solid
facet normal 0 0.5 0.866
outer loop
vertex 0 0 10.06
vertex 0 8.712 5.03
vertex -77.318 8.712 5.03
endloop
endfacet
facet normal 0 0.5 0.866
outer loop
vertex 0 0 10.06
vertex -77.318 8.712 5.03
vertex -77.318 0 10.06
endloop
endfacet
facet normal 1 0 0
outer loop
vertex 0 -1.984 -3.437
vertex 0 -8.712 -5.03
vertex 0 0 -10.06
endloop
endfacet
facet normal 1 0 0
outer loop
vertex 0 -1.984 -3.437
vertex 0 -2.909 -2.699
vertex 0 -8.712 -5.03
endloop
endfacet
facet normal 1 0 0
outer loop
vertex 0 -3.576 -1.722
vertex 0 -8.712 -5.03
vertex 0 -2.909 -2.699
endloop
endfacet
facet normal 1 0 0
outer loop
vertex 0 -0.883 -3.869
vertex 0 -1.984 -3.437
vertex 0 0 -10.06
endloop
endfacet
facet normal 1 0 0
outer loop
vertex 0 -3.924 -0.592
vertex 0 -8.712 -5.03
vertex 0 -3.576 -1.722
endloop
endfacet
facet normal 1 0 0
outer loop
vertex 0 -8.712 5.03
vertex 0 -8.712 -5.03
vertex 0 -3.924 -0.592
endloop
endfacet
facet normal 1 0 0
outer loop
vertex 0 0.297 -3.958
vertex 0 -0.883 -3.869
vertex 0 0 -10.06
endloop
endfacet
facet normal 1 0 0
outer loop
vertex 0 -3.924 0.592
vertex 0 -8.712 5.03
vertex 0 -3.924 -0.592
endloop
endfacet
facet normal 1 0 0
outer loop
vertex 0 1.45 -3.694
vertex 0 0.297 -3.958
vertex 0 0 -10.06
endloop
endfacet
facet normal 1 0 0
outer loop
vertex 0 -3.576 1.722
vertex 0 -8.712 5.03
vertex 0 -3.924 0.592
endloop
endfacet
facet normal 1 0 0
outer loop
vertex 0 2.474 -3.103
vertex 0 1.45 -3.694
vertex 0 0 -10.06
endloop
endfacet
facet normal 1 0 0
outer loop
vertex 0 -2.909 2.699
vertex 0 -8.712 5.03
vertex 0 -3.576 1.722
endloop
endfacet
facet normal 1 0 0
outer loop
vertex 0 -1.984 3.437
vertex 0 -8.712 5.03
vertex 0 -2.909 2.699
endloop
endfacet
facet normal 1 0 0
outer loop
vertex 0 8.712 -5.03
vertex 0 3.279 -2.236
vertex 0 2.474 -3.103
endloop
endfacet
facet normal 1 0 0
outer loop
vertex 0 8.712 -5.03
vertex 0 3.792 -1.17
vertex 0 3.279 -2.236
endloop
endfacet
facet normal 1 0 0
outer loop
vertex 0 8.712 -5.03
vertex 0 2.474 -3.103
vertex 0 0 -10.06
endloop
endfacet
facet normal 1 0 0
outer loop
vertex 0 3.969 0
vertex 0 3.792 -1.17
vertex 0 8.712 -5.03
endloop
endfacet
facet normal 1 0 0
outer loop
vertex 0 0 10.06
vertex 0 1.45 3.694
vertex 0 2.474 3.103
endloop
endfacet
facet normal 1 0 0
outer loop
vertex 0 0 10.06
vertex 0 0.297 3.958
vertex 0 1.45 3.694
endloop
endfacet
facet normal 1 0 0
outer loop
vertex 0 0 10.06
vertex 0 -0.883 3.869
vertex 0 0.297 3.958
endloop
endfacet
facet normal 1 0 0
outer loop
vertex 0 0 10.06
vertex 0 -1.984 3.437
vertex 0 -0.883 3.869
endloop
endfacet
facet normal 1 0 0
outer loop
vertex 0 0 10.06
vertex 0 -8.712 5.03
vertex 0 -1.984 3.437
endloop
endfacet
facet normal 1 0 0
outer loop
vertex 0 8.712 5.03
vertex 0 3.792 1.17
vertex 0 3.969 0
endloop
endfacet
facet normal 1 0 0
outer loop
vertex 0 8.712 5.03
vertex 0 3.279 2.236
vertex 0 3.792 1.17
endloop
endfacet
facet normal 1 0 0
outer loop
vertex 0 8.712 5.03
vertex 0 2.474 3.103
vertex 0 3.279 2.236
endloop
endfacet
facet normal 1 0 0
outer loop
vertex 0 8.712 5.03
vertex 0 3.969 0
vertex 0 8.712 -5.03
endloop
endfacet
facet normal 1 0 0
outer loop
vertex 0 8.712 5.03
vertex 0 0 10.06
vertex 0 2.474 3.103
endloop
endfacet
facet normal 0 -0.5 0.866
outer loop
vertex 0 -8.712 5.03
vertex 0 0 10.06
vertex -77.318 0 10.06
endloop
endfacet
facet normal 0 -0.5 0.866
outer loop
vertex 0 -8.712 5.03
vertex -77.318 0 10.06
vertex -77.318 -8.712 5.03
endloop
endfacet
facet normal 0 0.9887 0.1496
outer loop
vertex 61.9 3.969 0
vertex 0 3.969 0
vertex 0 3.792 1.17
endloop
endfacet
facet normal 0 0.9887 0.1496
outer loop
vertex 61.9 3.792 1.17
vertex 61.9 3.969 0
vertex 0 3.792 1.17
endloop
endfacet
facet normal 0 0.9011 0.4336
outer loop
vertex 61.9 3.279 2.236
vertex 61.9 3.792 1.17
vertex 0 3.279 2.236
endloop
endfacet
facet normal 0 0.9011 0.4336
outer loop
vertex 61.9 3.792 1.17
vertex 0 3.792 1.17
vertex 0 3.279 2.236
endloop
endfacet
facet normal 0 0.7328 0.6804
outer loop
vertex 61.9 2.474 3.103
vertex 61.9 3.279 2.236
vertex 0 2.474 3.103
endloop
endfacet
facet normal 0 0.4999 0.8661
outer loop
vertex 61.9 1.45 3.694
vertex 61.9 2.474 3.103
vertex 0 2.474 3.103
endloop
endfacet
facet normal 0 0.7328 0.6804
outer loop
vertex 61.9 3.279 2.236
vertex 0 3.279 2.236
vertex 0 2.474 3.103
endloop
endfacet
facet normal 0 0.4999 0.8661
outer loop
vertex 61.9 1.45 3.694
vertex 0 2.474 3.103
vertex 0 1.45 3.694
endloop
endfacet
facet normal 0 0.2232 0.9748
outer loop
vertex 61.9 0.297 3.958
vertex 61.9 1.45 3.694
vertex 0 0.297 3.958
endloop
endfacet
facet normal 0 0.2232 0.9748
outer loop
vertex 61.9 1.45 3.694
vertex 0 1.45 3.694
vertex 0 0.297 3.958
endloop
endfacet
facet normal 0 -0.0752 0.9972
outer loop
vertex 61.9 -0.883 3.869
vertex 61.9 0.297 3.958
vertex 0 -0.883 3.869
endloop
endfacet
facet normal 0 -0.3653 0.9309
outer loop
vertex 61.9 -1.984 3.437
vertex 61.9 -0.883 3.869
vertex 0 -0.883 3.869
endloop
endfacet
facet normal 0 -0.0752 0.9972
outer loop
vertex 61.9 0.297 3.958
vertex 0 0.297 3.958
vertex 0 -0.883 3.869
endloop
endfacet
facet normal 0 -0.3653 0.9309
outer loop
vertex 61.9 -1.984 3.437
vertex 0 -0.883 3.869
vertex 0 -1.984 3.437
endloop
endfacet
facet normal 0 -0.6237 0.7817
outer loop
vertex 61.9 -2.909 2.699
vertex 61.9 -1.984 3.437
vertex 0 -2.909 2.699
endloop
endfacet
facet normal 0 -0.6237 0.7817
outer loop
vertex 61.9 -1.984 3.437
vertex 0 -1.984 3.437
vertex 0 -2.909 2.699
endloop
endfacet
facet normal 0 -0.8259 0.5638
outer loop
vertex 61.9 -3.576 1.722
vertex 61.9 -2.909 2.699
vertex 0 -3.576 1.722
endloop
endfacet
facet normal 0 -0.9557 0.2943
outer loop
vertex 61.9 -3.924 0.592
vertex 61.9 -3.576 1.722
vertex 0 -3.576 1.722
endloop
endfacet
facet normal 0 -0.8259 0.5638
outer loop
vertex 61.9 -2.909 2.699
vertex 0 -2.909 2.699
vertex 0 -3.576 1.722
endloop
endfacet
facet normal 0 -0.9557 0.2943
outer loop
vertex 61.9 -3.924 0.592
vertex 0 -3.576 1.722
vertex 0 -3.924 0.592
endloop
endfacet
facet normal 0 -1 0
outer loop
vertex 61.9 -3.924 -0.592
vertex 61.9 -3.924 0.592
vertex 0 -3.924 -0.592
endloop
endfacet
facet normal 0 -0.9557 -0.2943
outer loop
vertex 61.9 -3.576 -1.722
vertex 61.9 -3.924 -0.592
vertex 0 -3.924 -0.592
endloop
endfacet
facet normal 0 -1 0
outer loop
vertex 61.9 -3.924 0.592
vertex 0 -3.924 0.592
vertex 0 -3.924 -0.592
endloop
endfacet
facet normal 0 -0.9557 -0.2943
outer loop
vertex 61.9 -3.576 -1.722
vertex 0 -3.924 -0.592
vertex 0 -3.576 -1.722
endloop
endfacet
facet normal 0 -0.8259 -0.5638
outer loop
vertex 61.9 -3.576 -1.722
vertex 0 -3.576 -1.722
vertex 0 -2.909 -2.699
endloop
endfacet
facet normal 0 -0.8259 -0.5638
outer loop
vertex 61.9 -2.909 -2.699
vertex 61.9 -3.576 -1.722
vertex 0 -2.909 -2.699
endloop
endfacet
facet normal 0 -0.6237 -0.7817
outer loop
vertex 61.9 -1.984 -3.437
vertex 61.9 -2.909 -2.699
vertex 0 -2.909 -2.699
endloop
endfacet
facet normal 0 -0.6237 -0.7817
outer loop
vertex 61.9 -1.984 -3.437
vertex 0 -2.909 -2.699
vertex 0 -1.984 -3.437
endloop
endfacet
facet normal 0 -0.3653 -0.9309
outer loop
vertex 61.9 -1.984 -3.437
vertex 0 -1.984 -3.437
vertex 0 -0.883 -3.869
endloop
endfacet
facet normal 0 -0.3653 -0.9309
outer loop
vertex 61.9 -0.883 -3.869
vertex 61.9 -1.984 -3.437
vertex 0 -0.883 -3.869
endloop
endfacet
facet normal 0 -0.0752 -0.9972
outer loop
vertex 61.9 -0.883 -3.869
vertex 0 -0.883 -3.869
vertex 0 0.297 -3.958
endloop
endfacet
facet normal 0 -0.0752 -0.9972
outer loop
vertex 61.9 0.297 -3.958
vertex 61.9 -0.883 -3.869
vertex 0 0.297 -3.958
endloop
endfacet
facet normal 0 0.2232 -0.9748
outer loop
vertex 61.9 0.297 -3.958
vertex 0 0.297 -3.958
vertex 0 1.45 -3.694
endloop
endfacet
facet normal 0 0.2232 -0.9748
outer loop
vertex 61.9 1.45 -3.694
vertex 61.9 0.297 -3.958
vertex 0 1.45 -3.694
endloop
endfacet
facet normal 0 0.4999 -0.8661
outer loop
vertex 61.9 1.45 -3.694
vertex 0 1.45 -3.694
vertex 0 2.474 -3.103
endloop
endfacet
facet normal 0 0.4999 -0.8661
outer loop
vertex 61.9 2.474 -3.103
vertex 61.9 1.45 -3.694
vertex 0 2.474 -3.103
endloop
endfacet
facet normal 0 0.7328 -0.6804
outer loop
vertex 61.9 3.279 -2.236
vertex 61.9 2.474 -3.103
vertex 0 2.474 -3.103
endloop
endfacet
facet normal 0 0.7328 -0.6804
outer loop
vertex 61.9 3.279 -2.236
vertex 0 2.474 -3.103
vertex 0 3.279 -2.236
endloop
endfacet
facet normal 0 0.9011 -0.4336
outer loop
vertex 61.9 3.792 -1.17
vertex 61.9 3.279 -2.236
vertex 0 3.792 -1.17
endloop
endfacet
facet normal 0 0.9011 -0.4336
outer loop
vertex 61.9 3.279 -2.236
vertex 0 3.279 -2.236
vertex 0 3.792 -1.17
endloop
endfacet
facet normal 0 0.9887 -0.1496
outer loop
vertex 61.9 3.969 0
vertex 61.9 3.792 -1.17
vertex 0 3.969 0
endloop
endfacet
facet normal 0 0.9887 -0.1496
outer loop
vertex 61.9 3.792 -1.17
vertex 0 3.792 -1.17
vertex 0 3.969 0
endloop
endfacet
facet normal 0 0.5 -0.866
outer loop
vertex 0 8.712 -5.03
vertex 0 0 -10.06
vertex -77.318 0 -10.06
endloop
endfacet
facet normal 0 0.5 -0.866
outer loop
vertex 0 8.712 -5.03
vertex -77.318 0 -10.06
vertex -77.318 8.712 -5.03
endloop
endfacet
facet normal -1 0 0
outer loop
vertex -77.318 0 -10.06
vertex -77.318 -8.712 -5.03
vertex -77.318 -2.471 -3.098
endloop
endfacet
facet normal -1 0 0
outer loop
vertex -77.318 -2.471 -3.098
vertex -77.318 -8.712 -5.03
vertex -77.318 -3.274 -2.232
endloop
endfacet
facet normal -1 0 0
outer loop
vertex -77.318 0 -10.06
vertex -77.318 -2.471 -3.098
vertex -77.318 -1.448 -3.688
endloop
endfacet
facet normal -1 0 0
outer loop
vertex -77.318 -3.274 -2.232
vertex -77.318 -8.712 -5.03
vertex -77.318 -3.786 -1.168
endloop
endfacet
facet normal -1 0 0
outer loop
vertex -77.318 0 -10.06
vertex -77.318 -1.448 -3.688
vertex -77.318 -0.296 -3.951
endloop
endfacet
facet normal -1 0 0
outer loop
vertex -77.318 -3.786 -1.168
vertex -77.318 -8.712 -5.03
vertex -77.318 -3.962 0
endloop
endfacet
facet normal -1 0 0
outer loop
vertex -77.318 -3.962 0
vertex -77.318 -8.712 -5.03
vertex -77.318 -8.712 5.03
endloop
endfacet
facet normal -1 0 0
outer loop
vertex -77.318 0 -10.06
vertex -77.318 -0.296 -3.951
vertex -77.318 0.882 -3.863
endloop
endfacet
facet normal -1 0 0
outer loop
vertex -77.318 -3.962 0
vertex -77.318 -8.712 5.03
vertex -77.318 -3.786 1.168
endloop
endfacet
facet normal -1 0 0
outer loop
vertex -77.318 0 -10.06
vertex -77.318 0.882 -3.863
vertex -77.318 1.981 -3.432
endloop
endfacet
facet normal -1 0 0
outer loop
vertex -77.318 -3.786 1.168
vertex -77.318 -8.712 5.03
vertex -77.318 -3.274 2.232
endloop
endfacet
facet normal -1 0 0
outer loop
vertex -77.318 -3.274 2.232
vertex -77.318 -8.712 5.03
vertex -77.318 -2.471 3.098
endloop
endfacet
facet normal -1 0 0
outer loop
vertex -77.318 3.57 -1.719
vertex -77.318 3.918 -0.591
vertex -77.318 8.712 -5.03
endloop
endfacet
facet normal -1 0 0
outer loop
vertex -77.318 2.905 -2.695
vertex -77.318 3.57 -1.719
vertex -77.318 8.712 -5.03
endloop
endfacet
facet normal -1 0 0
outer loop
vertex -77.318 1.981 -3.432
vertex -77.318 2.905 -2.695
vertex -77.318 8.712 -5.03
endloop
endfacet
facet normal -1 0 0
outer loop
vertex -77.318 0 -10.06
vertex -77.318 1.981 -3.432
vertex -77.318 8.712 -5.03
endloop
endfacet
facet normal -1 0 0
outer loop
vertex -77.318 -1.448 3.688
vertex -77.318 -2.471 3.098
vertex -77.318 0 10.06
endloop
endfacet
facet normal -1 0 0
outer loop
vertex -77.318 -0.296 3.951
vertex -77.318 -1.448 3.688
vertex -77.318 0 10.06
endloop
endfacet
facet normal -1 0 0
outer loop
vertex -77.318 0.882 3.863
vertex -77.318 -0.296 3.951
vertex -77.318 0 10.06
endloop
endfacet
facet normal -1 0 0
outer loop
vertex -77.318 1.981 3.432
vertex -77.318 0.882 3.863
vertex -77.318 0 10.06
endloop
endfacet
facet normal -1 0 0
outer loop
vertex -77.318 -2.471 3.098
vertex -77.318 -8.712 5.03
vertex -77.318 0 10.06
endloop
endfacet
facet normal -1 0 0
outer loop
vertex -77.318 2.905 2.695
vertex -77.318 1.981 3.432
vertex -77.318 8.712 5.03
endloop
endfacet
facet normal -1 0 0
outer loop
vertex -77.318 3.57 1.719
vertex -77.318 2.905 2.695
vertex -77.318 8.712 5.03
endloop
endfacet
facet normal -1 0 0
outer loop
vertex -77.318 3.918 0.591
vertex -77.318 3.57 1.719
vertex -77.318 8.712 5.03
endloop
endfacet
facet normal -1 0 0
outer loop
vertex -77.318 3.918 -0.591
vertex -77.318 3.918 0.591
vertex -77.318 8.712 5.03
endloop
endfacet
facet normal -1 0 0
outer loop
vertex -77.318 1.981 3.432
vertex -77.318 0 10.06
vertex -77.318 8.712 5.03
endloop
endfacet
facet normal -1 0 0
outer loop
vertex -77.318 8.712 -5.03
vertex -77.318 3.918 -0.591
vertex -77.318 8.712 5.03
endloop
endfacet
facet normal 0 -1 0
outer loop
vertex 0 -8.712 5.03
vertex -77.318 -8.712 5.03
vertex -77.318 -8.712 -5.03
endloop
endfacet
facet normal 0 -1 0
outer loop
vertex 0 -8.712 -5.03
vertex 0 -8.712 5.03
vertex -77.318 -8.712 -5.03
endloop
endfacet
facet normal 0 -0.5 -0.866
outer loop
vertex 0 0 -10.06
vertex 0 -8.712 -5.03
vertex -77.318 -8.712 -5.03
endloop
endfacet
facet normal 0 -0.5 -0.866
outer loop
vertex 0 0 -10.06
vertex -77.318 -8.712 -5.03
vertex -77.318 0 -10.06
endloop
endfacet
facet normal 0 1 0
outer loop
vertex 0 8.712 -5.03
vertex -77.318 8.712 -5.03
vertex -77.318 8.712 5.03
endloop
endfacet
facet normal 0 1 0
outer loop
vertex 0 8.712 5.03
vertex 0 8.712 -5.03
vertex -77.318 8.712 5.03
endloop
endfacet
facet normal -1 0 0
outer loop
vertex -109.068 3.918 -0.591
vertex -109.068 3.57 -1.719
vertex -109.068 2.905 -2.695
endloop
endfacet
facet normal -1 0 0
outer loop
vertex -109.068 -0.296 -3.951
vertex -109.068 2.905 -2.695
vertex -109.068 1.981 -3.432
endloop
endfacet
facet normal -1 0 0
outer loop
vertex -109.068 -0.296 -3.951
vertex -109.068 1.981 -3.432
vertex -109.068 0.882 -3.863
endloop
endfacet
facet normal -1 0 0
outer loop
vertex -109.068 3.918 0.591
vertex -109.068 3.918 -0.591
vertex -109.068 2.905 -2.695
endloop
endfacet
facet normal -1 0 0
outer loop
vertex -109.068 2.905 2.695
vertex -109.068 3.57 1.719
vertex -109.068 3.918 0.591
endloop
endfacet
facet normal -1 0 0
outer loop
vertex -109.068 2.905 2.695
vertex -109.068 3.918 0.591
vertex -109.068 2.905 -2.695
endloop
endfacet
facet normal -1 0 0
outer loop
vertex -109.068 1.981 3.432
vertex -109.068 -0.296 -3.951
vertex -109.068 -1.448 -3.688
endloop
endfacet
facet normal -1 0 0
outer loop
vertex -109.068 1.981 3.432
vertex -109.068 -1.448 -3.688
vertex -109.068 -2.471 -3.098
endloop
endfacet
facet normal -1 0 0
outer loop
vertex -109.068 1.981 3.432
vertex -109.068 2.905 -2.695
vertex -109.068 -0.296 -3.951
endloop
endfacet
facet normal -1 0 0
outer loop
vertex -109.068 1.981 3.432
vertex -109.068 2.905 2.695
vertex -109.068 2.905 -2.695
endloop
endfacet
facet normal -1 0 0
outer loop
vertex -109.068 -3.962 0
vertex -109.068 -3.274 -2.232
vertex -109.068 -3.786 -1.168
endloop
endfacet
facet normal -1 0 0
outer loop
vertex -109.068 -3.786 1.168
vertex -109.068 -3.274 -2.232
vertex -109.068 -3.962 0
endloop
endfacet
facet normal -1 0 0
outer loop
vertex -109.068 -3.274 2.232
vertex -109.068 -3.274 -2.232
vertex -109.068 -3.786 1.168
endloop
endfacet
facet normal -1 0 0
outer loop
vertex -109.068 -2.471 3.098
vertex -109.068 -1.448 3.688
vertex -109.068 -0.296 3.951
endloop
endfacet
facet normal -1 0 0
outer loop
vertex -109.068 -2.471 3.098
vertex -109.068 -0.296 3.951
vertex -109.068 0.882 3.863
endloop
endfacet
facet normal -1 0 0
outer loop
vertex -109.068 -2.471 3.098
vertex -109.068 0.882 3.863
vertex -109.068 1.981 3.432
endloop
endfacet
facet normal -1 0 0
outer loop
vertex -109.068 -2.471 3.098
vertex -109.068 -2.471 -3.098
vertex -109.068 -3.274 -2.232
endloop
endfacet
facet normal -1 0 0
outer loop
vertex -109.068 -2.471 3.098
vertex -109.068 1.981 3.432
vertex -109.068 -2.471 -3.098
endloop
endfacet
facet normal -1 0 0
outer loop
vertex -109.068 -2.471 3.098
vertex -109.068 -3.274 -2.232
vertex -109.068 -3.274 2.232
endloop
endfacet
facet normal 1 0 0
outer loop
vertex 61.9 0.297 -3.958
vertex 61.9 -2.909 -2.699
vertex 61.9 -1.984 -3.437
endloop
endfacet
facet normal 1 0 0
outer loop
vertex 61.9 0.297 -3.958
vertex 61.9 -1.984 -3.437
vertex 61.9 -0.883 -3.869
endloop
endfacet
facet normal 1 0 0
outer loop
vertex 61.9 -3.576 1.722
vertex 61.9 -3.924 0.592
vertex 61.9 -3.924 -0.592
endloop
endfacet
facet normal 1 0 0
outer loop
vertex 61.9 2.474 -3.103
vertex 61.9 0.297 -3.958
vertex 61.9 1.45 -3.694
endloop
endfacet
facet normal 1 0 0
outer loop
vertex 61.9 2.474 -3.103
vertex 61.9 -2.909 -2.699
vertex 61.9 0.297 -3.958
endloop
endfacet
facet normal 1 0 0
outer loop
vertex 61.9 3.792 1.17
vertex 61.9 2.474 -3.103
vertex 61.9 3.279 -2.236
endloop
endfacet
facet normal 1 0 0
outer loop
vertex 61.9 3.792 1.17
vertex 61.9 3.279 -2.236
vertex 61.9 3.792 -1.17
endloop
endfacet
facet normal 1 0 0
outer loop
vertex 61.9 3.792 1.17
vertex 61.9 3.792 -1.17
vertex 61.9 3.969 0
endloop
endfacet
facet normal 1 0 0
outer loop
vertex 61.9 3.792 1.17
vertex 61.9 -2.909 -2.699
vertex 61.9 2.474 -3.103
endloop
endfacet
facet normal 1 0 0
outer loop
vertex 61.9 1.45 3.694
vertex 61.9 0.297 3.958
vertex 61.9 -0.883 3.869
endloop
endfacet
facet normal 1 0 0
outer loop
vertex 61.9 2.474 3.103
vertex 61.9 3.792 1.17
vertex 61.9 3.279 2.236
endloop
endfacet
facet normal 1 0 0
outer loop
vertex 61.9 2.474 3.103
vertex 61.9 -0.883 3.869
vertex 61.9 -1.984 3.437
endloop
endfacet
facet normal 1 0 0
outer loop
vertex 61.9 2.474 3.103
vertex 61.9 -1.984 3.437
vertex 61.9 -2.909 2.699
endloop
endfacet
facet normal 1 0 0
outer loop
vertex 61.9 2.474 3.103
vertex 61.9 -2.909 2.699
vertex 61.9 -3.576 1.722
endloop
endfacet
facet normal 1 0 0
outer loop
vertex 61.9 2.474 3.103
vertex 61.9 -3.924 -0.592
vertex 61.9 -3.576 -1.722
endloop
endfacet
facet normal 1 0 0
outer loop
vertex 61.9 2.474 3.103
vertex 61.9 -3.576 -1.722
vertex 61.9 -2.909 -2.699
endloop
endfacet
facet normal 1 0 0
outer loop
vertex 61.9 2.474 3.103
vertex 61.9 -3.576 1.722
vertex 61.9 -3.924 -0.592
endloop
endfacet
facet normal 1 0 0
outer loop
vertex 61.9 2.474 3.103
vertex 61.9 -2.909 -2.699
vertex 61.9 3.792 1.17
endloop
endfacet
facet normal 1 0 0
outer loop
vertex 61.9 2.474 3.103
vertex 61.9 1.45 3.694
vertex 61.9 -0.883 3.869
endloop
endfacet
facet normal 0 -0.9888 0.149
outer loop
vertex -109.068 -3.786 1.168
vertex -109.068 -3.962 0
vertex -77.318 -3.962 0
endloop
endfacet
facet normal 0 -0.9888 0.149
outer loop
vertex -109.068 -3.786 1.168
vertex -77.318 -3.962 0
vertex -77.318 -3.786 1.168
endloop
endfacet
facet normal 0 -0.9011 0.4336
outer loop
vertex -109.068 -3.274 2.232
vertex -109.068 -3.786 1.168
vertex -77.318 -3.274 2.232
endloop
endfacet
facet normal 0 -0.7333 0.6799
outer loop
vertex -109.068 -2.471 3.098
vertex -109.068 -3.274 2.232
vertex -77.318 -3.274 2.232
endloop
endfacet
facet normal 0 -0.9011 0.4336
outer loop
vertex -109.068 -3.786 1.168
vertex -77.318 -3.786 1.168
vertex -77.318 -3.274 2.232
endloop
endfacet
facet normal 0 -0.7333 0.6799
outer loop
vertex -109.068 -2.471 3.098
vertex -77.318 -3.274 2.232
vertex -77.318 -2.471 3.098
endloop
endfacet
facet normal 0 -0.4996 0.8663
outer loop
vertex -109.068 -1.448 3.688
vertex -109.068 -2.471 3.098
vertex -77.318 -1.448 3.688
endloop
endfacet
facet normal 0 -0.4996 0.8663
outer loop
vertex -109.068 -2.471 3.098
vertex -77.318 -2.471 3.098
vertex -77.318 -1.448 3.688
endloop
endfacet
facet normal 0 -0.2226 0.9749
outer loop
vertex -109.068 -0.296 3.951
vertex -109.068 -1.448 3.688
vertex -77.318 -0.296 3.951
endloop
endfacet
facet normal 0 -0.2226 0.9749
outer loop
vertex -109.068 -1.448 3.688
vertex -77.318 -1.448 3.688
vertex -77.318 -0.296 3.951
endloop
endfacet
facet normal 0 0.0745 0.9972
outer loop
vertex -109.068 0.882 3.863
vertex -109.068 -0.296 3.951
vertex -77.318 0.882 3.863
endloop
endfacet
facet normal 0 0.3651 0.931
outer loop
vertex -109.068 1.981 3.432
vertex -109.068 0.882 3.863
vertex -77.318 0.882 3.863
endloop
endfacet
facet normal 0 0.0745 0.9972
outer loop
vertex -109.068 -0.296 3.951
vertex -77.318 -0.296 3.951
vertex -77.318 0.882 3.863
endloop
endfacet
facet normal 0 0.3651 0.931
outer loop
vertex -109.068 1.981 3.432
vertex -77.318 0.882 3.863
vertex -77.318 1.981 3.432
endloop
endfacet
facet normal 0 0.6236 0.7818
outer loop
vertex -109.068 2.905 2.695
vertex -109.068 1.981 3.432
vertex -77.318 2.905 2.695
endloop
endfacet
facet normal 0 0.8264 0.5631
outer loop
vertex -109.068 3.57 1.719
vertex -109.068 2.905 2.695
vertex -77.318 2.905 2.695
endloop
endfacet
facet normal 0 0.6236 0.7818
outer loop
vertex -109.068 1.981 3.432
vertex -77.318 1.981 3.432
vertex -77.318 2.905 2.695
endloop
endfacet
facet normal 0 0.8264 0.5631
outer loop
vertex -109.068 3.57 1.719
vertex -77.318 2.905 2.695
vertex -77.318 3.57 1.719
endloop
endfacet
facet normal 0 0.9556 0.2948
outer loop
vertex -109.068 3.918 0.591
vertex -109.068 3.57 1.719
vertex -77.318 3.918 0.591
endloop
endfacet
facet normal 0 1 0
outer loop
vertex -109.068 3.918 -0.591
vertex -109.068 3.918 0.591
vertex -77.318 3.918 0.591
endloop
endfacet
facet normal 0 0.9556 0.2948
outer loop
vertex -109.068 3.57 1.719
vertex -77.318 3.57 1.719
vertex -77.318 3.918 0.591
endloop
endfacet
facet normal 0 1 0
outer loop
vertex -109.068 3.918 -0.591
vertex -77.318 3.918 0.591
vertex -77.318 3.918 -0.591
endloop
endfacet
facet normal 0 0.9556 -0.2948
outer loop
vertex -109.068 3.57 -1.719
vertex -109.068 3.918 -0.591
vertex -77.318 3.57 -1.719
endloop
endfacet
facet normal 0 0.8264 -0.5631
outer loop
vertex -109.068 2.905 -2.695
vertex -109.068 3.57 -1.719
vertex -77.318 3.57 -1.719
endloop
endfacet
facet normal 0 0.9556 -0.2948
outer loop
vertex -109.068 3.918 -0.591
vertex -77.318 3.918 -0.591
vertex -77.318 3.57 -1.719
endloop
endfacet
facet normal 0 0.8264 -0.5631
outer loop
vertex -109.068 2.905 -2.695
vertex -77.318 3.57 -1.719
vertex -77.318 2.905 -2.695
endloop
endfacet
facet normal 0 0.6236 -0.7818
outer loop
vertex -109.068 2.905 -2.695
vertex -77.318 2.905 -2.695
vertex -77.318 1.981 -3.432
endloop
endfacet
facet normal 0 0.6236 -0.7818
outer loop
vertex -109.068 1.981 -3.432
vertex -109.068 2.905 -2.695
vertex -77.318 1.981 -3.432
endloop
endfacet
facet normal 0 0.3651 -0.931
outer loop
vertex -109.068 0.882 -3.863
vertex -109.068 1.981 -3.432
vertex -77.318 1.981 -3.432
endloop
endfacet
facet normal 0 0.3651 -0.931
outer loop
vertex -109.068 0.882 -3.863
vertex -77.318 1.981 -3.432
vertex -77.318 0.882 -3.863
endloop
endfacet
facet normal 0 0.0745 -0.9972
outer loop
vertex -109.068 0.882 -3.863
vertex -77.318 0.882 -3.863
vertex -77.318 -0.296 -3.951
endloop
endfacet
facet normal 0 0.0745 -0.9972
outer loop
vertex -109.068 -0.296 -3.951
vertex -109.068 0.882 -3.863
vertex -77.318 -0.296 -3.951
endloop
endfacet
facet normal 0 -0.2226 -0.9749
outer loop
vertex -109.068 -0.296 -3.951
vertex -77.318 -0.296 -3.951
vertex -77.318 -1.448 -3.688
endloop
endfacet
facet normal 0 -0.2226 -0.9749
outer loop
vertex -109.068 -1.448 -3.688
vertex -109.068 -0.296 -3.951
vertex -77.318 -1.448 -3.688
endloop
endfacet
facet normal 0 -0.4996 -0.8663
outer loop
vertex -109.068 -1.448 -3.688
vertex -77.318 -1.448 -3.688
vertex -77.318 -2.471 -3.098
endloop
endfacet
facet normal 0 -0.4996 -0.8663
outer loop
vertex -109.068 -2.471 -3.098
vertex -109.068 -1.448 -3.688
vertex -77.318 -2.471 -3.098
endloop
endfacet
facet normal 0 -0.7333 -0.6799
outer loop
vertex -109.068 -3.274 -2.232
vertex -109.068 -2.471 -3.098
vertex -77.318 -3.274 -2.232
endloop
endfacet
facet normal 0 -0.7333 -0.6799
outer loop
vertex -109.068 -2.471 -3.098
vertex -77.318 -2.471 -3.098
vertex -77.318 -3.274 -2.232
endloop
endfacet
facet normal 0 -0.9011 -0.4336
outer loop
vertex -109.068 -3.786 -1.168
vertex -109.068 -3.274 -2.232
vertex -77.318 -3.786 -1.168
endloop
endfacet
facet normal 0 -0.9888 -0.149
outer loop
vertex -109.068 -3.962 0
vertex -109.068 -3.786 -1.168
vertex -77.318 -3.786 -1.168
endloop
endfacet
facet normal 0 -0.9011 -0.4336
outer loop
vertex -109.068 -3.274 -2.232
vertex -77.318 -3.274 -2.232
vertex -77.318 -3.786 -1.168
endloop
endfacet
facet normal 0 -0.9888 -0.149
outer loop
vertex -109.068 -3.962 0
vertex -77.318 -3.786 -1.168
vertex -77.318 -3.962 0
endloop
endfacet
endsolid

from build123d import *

# Parameters (mm, degrees)
F1_DEPTH = 77.3176
F2_R     = 3.9624
F3_DEPTH = 31.75
F4_R     = 3.96875
F5_DEPTH = 61.8998


with BuildPart() as f1:
    # F0 (on Right) → F1 (new body)
    with BuildSketch(Plane.YZ):
        Polygon((8.7122, -5.029991), (8.7122, 5.029991), (0, 10.059982), (-8.7122, 5.029991), (-8.7122, -5.029991), (0, -10.059982), align=None)
    extrude(amount=-F1_DEPTH)

    # F2 (on face) → F3 (join)
    with BuildSketch(Plane(origin=(-77.3176, 0, 0), x_dir=(0, -1, 0), z_dir=(-1, 0, 0))):
        Circle(F2_R)
    extrude(amount=F3_DEPTH)

    # F4 (on face) → F5 (join)
    with BuildSketch(Plane.YZ):
        Circle(F4_R)
    extrude(amount=F5_DEPTH)


solid = f1.part
